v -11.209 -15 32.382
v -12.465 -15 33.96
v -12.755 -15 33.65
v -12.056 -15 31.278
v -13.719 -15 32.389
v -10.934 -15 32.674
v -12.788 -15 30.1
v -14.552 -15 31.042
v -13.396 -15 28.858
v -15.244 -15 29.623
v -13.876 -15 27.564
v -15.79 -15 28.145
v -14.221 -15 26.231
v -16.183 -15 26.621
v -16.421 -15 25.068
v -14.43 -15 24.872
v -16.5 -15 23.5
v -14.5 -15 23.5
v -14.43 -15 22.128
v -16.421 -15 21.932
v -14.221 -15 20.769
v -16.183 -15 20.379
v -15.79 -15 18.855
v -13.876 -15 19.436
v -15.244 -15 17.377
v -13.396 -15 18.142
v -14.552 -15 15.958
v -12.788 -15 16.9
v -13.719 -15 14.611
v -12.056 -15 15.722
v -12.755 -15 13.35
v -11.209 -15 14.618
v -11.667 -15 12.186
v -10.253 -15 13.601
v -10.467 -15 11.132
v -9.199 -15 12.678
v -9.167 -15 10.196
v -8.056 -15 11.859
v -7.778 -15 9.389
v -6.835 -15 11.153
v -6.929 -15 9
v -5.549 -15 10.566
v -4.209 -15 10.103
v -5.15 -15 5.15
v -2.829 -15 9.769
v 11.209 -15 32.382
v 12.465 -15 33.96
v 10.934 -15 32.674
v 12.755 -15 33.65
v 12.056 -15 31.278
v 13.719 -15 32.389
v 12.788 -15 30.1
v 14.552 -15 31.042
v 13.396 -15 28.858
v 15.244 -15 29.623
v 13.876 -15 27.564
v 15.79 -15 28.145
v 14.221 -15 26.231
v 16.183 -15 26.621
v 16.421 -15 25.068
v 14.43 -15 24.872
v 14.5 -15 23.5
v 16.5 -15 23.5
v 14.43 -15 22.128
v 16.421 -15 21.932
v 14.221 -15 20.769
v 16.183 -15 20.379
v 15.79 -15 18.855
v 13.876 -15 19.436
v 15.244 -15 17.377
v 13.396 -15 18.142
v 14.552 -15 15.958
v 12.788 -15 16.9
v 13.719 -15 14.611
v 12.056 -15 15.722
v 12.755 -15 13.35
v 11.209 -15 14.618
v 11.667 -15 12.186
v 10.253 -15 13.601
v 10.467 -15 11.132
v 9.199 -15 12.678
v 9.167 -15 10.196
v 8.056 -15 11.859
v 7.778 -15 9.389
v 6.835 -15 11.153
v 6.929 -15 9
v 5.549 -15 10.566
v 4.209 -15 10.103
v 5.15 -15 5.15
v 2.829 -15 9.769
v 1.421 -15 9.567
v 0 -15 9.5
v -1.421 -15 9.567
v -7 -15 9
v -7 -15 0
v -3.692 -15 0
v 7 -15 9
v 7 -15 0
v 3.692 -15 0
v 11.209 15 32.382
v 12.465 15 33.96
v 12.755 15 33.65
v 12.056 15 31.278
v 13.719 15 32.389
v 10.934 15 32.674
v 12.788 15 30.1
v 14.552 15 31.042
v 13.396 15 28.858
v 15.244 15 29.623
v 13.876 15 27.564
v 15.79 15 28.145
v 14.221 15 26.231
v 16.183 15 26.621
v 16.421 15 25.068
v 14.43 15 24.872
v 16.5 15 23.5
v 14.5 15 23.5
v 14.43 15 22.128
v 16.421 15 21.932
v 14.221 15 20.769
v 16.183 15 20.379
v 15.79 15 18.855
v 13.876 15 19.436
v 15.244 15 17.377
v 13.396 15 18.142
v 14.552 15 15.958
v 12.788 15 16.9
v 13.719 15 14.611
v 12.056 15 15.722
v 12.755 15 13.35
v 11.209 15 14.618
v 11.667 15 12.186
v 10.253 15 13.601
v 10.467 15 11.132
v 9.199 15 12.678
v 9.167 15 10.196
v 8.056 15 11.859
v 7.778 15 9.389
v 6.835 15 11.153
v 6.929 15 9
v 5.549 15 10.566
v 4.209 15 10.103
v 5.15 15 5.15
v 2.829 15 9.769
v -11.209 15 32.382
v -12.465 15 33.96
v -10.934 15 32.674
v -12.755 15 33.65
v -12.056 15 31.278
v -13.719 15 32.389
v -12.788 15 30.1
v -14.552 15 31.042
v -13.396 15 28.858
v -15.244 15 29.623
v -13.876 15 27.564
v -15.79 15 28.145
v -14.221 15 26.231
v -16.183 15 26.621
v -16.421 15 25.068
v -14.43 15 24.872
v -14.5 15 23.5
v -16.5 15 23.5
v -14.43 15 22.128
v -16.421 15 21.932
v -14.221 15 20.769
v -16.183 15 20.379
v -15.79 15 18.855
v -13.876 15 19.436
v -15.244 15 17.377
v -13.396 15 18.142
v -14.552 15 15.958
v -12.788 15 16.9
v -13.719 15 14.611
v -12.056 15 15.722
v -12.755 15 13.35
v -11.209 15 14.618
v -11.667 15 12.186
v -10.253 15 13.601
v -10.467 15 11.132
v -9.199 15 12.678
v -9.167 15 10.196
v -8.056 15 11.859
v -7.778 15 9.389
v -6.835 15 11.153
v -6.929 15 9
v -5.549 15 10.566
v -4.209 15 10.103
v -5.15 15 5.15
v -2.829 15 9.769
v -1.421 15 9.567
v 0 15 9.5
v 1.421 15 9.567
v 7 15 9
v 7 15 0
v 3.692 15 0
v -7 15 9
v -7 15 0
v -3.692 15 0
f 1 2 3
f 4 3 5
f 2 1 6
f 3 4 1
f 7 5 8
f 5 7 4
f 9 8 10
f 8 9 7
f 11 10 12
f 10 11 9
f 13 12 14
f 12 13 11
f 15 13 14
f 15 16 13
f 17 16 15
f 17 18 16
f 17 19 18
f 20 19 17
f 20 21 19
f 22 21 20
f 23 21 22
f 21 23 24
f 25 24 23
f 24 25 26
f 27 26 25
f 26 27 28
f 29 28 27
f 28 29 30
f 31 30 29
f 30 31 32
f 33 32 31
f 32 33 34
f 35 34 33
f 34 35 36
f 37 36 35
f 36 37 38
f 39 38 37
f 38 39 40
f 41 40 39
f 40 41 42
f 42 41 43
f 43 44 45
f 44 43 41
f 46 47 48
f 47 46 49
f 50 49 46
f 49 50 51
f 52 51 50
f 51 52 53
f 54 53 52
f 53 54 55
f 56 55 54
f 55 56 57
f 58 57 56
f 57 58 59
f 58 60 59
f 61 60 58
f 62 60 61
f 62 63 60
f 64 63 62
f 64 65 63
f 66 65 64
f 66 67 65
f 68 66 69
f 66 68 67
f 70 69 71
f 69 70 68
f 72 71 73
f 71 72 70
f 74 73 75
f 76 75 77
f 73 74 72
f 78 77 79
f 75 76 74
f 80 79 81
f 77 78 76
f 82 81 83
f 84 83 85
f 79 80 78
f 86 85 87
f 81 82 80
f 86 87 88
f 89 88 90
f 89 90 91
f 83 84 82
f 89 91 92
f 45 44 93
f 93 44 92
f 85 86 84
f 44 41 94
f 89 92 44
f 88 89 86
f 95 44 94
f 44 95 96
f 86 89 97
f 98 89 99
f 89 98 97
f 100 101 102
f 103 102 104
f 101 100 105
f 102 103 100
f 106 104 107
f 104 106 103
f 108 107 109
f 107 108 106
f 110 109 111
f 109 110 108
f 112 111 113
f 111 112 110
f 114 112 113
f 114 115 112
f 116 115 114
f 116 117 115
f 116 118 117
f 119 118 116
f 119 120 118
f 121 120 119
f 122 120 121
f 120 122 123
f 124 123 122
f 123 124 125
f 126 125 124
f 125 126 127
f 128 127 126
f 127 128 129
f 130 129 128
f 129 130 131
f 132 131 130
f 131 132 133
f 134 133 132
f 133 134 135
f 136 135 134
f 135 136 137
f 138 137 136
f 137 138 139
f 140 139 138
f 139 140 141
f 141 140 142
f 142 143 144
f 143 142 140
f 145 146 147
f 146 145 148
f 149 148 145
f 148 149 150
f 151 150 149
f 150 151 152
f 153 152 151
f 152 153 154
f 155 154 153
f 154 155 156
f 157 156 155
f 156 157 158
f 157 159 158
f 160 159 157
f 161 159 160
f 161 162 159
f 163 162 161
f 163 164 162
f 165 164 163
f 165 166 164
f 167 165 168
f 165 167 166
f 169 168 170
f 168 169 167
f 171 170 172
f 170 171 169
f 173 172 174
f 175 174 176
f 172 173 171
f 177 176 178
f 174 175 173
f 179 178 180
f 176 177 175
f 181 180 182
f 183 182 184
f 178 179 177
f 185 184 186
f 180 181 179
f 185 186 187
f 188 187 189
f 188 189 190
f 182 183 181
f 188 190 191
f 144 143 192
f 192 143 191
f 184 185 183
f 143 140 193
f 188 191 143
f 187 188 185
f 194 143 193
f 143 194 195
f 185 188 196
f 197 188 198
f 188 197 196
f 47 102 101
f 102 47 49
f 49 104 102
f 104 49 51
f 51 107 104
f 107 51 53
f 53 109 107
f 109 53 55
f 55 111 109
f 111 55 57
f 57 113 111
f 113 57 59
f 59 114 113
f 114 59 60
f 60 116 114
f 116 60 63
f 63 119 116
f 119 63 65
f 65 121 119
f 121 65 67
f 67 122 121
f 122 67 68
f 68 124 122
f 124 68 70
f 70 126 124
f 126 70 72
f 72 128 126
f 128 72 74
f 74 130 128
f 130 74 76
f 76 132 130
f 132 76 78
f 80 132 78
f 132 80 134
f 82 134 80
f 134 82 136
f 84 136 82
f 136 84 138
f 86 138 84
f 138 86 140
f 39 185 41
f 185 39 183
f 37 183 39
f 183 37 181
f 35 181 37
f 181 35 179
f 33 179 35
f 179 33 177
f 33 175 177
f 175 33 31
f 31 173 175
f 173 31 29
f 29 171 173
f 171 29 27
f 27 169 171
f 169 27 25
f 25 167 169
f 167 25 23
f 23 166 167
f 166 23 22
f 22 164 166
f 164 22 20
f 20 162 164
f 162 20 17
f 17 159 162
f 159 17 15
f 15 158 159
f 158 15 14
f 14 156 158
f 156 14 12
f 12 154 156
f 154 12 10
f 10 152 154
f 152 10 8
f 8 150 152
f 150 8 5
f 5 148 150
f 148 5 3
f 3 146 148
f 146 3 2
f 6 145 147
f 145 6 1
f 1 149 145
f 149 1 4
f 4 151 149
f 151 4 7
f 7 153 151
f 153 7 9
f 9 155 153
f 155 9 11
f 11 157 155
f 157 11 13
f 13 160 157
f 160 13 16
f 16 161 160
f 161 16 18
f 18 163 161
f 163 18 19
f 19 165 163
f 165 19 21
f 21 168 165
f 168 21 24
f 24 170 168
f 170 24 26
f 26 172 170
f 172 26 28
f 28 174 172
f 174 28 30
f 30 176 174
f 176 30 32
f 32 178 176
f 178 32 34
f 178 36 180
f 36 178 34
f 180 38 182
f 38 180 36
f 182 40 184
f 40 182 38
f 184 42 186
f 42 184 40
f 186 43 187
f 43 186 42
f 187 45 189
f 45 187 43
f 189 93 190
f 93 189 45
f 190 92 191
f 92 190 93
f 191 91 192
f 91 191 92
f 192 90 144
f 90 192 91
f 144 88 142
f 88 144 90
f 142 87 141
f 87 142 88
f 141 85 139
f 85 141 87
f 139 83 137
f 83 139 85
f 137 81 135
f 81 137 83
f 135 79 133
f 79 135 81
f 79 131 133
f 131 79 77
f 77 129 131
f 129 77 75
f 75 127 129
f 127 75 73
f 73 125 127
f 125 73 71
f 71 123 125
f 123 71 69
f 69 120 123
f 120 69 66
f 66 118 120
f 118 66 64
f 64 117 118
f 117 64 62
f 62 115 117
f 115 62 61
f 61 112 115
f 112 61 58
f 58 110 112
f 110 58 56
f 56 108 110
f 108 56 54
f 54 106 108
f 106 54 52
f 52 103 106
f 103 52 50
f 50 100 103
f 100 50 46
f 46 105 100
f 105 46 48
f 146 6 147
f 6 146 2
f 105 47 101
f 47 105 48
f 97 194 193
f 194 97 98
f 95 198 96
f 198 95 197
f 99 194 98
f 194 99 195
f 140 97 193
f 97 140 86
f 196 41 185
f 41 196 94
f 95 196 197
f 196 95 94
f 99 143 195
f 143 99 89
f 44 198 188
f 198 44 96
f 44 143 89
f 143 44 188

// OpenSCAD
// =====================================
// Toothbrush Clip Piece - Test Print
// Clip + arm + dovetail channel
// Print with dovetail channel face down on bed
// =====================================

include <_toothbrush_holder.scad>

// Dovetail back face at Z = grip_outer_x - plate_thickness = 30
// Rotate so back face is down, then shift to bed
rotate([180, 0, 0])
translate([0, 0, -(grip_outer_x - plate_thickness)])
    brush_clip_piece();
